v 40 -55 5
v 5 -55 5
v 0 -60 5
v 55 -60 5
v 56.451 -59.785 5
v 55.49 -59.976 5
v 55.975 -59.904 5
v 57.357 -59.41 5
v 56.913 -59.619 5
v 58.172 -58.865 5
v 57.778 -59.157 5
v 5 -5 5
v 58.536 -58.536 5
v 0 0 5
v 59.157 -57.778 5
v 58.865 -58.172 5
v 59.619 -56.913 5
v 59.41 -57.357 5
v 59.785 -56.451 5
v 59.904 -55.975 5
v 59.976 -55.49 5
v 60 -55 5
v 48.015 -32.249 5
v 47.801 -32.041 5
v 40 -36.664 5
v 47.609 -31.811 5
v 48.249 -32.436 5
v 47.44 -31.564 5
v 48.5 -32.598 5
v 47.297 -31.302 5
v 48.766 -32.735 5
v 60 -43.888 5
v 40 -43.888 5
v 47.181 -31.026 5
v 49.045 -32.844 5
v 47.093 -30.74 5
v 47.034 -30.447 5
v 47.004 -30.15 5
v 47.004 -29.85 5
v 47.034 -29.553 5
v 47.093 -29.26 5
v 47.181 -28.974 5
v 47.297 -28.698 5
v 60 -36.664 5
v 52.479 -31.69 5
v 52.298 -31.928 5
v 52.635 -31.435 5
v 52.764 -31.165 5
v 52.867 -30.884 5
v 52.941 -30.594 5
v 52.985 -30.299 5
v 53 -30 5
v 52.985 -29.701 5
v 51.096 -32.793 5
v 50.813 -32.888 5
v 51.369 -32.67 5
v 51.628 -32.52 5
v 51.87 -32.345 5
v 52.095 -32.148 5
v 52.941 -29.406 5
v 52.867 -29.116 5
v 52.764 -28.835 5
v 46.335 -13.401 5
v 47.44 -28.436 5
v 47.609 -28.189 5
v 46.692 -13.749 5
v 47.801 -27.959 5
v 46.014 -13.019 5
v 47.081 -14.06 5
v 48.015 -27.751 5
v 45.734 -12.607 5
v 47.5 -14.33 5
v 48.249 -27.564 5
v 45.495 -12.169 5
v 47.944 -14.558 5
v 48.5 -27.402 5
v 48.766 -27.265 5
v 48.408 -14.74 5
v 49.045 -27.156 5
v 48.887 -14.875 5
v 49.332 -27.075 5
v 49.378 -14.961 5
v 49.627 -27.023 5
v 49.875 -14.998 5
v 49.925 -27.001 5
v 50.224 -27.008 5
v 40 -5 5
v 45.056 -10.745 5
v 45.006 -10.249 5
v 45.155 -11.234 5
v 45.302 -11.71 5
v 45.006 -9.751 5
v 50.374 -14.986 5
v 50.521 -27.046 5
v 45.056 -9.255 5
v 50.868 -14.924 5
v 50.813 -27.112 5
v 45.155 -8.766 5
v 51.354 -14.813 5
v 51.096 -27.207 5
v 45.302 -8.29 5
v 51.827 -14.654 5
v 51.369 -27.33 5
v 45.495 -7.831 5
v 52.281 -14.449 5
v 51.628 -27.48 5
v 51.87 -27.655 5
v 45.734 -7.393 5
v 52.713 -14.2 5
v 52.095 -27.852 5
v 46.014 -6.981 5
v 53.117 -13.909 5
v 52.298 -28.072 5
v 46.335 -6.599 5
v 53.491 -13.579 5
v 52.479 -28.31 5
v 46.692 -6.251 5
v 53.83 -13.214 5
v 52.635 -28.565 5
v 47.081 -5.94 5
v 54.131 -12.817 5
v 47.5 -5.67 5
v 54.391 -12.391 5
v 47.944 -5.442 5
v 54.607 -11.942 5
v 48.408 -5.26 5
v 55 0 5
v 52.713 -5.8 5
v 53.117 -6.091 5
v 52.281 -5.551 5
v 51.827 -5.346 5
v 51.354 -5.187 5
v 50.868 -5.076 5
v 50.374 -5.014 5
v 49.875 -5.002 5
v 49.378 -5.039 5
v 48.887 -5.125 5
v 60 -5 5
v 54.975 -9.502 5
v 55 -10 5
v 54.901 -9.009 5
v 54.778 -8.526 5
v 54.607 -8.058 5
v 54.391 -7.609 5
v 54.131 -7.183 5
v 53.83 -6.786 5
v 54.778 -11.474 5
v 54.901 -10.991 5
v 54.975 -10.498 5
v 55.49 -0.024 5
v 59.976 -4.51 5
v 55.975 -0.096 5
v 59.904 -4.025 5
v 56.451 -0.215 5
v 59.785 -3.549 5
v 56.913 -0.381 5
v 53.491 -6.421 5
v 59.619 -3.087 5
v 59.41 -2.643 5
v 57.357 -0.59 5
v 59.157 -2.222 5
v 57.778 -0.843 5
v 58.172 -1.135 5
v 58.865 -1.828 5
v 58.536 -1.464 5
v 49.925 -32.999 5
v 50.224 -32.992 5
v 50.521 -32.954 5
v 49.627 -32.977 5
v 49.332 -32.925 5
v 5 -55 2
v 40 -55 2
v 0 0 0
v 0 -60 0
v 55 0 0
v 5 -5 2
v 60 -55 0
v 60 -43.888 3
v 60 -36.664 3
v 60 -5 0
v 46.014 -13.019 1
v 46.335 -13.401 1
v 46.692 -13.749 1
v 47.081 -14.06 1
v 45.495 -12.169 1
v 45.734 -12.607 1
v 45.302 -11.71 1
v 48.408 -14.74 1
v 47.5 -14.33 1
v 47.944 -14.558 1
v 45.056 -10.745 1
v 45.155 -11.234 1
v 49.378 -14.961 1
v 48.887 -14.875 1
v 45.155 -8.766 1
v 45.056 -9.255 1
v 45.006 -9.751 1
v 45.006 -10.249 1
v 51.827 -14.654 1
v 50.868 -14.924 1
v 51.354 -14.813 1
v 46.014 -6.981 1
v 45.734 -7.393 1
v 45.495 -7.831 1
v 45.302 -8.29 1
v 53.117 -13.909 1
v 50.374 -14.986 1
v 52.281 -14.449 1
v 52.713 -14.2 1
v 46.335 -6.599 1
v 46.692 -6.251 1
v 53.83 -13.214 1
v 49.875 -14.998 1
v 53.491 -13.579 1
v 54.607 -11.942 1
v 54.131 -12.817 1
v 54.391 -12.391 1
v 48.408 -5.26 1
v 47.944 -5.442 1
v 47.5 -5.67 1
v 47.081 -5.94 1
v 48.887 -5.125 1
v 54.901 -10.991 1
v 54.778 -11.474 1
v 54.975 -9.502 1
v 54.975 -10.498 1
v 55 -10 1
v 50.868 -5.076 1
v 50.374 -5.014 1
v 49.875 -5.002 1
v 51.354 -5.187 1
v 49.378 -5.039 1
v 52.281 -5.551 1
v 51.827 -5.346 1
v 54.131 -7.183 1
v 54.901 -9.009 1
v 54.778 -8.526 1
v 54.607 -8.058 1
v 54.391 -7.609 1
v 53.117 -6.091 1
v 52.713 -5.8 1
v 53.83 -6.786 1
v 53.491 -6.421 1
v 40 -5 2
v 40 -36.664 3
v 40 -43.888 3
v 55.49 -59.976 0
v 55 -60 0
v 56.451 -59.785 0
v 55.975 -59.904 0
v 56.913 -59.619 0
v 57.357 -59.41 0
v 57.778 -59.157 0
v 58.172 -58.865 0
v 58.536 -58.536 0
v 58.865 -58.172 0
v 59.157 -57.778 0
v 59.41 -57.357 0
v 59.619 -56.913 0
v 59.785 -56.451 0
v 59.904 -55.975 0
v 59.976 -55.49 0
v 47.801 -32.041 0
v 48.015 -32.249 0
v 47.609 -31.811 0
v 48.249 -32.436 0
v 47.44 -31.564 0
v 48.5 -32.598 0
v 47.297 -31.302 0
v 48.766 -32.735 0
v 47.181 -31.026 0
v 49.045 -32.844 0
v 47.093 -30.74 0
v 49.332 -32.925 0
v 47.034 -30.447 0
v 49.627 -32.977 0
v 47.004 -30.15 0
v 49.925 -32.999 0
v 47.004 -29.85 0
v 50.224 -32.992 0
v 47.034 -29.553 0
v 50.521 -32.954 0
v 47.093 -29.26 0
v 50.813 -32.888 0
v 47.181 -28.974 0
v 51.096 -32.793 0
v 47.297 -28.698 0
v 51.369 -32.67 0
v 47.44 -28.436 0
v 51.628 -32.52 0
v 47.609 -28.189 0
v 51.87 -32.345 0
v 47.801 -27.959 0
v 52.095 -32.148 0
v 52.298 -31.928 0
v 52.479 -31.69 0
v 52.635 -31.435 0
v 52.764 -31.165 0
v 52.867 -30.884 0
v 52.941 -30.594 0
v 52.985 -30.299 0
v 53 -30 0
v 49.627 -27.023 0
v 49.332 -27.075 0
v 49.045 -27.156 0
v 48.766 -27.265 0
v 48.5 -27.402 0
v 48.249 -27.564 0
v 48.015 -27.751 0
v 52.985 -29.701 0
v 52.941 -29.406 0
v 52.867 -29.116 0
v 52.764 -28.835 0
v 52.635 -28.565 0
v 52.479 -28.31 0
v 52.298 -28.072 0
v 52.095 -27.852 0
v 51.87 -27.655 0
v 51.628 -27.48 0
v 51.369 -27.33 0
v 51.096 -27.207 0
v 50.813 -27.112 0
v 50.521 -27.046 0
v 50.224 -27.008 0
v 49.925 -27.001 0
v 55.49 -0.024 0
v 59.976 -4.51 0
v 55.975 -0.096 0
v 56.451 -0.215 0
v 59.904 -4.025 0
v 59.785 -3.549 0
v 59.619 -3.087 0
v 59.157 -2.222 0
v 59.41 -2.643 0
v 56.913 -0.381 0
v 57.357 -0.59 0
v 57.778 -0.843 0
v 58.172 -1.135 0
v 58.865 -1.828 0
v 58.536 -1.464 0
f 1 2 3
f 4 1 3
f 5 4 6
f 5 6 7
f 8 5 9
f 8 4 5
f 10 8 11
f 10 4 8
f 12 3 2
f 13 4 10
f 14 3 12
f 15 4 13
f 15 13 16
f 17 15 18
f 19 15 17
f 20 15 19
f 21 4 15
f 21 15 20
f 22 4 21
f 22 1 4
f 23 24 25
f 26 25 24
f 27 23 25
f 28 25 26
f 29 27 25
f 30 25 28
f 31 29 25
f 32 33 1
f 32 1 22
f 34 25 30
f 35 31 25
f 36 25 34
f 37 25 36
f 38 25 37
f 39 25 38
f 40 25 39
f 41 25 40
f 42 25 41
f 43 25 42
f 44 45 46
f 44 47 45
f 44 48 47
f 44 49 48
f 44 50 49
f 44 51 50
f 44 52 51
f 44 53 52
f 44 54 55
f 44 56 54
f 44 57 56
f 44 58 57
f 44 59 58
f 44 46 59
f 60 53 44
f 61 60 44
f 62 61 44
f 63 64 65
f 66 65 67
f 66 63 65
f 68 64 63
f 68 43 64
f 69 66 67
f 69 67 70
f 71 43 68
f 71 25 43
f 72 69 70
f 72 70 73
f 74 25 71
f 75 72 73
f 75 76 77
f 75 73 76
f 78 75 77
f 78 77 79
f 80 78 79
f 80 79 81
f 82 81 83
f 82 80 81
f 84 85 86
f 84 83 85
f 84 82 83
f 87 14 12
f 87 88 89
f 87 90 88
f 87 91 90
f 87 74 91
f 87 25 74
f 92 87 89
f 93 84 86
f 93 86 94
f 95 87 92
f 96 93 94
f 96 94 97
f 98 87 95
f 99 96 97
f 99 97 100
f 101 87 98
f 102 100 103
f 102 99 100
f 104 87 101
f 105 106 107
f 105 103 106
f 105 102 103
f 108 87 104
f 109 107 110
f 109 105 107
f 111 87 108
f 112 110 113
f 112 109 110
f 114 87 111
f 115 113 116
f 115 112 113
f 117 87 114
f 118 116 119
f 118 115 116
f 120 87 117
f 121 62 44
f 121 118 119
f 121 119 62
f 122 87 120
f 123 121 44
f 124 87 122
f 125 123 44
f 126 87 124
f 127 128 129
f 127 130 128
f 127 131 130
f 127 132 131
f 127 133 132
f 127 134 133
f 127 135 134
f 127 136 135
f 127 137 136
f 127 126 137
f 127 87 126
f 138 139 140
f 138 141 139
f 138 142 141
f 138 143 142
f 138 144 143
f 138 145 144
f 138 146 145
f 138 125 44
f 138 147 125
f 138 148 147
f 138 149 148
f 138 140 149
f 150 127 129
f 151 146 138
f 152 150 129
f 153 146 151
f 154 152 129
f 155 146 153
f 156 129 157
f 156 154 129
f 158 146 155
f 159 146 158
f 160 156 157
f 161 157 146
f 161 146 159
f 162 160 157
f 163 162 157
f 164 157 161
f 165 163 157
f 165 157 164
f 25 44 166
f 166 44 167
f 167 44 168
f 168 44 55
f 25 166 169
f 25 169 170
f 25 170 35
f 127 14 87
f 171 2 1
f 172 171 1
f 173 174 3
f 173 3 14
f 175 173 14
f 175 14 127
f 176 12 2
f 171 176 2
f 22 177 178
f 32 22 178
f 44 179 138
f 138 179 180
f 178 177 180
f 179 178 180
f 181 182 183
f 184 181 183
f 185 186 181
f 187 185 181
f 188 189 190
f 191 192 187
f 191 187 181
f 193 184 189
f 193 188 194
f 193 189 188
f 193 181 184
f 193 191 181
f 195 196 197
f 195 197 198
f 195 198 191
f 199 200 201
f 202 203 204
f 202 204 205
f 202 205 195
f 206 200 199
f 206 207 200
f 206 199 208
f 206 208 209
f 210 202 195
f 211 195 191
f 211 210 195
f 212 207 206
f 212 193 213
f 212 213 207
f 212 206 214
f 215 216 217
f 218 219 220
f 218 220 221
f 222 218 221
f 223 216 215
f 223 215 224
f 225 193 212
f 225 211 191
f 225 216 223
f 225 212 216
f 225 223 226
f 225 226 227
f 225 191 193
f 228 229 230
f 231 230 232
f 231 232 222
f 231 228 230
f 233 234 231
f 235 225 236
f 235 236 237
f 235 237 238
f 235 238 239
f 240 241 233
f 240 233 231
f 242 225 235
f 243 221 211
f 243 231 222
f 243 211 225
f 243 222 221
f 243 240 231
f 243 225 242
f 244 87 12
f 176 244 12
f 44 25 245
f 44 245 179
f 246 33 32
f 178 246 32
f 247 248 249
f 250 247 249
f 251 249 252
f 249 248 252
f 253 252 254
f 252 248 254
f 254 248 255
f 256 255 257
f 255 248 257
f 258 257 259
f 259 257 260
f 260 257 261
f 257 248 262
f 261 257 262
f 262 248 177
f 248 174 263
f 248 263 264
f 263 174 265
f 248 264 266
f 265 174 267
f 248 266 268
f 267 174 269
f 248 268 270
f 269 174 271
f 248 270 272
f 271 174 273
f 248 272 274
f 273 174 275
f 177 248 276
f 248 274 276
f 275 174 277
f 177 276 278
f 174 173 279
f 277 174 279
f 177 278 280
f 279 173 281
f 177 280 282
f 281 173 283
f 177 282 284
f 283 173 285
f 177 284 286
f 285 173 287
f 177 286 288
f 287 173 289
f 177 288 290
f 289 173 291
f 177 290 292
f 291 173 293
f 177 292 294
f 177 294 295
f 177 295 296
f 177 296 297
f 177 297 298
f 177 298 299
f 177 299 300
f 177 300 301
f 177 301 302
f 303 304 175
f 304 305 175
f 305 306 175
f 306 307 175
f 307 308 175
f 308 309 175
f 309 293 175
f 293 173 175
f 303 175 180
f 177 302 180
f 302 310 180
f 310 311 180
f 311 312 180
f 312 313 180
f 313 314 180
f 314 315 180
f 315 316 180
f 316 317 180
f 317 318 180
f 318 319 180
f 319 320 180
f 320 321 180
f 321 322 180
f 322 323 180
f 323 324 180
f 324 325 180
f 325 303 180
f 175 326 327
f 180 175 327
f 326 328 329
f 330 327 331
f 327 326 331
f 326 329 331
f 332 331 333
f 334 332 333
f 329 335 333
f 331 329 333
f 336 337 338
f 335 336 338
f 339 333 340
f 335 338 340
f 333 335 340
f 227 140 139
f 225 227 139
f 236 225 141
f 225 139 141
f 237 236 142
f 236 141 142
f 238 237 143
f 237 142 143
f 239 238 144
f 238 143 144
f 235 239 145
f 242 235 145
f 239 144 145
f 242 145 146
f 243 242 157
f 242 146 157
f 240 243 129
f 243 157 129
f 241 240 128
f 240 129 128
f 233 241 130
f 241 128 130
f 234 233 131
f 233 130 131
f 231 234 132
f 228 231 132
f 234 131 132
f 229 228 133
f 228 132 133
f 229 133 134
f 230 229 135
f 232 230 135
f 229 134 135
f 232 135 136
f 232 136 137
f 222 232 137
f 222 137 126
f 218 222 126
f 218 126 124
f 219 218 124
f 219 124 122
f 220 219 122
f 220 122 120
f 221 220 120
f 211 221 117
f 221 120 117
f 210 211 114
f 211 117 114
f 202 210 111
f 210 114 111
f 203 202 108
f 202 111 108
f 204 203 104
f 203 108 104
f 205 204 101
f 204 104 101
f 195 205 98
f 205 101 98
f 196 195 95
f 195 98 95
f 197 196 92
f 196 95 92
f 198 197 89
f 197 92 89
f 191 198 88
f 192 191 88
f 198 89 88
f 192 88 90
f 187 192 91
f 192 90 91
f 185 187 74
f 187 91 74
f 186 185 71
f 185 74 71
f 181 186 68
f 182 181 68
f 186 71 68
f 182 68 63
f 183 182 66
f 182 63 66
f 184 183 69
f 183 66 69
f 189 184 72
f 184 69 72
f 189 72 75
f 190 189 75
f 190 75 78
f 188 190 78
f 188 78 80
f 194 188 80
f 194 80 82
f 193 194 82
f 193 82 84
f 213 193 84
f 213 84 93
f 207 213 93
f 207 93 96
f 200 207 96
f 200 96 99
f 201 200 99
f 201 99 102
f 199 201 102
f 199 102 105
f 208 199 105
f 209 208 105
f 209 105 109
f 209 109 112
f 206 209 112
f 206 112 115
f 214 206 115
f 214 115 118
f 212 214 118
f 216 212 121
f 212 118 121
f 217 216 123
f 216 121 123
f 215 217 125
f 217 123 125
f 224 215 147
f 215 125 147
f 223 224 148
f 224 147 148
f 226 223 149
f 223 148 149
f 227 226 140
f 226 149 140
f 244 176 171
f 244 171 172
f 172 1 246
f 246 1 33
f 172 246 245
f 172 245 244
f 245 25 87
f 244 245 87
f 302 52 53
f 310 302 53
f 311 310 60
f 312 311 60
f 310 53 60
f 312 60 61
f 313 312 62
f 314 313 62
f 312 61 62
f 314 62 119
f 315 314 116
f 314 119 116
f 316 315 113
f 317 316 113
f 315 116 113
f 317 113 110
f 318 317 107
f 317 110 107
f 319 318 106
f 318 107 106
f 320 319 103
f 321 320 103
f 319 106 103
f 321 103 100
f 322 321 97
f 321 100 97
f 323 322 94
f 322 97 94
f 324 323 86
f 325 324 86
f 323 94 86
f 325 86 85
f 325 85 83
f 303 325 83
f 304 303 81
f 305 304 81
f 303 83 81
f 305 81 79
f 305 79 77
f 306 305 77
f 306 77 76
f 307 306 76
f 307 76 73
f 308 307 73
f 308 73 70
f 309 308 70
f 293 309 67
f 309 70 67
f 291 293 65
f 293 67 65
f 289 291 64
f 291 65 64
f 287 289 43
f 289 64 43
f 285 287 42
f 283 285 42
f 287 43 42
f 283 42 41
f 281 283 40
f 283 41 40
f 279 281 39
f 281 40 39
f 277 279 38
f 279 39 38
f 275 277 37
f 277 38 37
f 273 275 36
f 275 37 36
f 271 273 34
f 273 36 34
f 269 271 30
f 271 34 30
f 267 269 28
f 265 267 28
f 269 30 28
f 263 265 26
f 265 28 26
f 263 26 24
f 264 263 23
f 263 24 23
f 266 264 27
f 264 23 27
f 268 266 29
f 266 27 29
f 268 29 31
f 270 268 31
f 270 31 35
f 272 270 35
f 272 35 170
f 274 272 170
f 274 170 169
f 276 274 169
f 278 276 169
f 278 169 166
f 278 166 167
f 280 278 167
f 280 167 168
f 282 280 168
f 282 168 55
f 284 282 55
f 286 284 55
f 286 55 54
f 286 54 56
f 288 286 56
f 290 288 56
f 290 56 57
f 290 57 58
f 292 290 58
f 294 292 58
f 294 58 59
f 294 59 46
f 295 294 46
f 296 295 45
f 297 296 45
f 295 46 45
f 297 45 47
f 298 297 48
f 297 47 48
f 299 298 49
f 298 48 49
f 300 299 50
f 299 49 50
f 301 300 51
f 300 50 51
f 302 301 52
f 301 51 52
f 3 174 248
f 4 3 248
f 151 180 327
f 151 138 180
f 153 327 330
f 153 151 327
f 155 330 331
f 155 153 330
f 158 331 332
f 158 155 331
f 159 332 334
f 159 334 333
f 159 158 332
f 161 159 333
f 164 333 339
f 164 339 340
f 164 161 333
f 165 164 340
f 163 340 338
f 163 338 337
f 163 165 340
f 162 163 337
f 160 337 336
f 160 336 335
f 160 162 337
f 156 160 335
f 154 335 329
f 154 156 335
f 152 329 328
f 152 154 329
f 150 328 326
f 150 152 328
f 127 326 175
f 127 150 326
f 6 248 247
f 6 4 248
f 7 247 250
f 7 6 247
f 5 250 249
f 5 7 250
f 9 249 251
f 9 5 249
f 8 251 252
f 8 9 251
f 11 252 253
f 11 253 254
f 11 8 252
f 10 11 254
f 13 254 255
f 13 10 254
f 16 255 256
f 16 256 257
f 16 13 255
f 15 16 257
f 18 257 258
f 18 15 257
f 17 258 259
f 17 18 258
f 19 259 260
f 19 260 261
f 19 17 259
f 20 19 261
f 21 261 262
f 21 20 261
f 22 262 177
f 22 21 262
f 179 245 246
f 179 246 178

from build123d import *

# Parameters (mm, degrees)
F0_W     = 60
F0_H     = 60
F1_DEPTH = 5
F2_R     = 5
F4_DEPTH = 3
F3_R     = 5
F5_DEPTH = 4
F3_R_2   = 3
F6_DEPTH = 5
F3_W     = 20
F3_H     = 7.223957
F7_DEPTH = 2


with BuildPart() as f1:
    # F0 (on Top) → F1 (new body)
    with BuildSketch(Plane.XY):
        with Locations((30, -30)):
            Rectangle(F0_W, F0_H)
    extrude(amount=F1_DEPTH)

    # F2
    f2_edges = [f1.edges().sort_by_distance(p)[0] for p in [
        (60, 0, 2.5),
        (60, -60, 2.5),
    ]]
    fillet(f2_edges, radius=F2_R)

    # F3 (on face) → F4 (cut)
    with BuildSketch(Plane.XY.offset(5)):
        Polygon((40, -5), (5, -5), (5, -55), (40, -55), (40, -43.888409), (40, -36.664452), align=None)
    extrude(amount=-F4_DEPTH, mode=Mode.SUBTRACT)

    # F3 (on face) → F5 (cut)
    with BuildSketch(Plane.XY.offset(5)):
        with Locations((50, -10)):
            Circle(F3_R)
    extrude(amount=-F5_DEPTH, mode=Mode.SUBTRACT)

    # F3 (on face) → F6 (cut)
    with BuildSketch(Plane.XY.offset(5)):
        with Locations((50, -30)):
            Circle(F3_R_2)
    extrude(amount=-F6_DEPTH, mode=Mode.SUBTRACT)

    # F3 (on face) → F7 (cut)
    with BuildSketch(Plane.XY.offset(5)):
        with Locations((50, -40.27643)):
            Rectangle(F3_W, F3_H)
    extrude(amount=-F7_DEPTH, mode=Mode.SUBTRACT)


solid = f1.part
